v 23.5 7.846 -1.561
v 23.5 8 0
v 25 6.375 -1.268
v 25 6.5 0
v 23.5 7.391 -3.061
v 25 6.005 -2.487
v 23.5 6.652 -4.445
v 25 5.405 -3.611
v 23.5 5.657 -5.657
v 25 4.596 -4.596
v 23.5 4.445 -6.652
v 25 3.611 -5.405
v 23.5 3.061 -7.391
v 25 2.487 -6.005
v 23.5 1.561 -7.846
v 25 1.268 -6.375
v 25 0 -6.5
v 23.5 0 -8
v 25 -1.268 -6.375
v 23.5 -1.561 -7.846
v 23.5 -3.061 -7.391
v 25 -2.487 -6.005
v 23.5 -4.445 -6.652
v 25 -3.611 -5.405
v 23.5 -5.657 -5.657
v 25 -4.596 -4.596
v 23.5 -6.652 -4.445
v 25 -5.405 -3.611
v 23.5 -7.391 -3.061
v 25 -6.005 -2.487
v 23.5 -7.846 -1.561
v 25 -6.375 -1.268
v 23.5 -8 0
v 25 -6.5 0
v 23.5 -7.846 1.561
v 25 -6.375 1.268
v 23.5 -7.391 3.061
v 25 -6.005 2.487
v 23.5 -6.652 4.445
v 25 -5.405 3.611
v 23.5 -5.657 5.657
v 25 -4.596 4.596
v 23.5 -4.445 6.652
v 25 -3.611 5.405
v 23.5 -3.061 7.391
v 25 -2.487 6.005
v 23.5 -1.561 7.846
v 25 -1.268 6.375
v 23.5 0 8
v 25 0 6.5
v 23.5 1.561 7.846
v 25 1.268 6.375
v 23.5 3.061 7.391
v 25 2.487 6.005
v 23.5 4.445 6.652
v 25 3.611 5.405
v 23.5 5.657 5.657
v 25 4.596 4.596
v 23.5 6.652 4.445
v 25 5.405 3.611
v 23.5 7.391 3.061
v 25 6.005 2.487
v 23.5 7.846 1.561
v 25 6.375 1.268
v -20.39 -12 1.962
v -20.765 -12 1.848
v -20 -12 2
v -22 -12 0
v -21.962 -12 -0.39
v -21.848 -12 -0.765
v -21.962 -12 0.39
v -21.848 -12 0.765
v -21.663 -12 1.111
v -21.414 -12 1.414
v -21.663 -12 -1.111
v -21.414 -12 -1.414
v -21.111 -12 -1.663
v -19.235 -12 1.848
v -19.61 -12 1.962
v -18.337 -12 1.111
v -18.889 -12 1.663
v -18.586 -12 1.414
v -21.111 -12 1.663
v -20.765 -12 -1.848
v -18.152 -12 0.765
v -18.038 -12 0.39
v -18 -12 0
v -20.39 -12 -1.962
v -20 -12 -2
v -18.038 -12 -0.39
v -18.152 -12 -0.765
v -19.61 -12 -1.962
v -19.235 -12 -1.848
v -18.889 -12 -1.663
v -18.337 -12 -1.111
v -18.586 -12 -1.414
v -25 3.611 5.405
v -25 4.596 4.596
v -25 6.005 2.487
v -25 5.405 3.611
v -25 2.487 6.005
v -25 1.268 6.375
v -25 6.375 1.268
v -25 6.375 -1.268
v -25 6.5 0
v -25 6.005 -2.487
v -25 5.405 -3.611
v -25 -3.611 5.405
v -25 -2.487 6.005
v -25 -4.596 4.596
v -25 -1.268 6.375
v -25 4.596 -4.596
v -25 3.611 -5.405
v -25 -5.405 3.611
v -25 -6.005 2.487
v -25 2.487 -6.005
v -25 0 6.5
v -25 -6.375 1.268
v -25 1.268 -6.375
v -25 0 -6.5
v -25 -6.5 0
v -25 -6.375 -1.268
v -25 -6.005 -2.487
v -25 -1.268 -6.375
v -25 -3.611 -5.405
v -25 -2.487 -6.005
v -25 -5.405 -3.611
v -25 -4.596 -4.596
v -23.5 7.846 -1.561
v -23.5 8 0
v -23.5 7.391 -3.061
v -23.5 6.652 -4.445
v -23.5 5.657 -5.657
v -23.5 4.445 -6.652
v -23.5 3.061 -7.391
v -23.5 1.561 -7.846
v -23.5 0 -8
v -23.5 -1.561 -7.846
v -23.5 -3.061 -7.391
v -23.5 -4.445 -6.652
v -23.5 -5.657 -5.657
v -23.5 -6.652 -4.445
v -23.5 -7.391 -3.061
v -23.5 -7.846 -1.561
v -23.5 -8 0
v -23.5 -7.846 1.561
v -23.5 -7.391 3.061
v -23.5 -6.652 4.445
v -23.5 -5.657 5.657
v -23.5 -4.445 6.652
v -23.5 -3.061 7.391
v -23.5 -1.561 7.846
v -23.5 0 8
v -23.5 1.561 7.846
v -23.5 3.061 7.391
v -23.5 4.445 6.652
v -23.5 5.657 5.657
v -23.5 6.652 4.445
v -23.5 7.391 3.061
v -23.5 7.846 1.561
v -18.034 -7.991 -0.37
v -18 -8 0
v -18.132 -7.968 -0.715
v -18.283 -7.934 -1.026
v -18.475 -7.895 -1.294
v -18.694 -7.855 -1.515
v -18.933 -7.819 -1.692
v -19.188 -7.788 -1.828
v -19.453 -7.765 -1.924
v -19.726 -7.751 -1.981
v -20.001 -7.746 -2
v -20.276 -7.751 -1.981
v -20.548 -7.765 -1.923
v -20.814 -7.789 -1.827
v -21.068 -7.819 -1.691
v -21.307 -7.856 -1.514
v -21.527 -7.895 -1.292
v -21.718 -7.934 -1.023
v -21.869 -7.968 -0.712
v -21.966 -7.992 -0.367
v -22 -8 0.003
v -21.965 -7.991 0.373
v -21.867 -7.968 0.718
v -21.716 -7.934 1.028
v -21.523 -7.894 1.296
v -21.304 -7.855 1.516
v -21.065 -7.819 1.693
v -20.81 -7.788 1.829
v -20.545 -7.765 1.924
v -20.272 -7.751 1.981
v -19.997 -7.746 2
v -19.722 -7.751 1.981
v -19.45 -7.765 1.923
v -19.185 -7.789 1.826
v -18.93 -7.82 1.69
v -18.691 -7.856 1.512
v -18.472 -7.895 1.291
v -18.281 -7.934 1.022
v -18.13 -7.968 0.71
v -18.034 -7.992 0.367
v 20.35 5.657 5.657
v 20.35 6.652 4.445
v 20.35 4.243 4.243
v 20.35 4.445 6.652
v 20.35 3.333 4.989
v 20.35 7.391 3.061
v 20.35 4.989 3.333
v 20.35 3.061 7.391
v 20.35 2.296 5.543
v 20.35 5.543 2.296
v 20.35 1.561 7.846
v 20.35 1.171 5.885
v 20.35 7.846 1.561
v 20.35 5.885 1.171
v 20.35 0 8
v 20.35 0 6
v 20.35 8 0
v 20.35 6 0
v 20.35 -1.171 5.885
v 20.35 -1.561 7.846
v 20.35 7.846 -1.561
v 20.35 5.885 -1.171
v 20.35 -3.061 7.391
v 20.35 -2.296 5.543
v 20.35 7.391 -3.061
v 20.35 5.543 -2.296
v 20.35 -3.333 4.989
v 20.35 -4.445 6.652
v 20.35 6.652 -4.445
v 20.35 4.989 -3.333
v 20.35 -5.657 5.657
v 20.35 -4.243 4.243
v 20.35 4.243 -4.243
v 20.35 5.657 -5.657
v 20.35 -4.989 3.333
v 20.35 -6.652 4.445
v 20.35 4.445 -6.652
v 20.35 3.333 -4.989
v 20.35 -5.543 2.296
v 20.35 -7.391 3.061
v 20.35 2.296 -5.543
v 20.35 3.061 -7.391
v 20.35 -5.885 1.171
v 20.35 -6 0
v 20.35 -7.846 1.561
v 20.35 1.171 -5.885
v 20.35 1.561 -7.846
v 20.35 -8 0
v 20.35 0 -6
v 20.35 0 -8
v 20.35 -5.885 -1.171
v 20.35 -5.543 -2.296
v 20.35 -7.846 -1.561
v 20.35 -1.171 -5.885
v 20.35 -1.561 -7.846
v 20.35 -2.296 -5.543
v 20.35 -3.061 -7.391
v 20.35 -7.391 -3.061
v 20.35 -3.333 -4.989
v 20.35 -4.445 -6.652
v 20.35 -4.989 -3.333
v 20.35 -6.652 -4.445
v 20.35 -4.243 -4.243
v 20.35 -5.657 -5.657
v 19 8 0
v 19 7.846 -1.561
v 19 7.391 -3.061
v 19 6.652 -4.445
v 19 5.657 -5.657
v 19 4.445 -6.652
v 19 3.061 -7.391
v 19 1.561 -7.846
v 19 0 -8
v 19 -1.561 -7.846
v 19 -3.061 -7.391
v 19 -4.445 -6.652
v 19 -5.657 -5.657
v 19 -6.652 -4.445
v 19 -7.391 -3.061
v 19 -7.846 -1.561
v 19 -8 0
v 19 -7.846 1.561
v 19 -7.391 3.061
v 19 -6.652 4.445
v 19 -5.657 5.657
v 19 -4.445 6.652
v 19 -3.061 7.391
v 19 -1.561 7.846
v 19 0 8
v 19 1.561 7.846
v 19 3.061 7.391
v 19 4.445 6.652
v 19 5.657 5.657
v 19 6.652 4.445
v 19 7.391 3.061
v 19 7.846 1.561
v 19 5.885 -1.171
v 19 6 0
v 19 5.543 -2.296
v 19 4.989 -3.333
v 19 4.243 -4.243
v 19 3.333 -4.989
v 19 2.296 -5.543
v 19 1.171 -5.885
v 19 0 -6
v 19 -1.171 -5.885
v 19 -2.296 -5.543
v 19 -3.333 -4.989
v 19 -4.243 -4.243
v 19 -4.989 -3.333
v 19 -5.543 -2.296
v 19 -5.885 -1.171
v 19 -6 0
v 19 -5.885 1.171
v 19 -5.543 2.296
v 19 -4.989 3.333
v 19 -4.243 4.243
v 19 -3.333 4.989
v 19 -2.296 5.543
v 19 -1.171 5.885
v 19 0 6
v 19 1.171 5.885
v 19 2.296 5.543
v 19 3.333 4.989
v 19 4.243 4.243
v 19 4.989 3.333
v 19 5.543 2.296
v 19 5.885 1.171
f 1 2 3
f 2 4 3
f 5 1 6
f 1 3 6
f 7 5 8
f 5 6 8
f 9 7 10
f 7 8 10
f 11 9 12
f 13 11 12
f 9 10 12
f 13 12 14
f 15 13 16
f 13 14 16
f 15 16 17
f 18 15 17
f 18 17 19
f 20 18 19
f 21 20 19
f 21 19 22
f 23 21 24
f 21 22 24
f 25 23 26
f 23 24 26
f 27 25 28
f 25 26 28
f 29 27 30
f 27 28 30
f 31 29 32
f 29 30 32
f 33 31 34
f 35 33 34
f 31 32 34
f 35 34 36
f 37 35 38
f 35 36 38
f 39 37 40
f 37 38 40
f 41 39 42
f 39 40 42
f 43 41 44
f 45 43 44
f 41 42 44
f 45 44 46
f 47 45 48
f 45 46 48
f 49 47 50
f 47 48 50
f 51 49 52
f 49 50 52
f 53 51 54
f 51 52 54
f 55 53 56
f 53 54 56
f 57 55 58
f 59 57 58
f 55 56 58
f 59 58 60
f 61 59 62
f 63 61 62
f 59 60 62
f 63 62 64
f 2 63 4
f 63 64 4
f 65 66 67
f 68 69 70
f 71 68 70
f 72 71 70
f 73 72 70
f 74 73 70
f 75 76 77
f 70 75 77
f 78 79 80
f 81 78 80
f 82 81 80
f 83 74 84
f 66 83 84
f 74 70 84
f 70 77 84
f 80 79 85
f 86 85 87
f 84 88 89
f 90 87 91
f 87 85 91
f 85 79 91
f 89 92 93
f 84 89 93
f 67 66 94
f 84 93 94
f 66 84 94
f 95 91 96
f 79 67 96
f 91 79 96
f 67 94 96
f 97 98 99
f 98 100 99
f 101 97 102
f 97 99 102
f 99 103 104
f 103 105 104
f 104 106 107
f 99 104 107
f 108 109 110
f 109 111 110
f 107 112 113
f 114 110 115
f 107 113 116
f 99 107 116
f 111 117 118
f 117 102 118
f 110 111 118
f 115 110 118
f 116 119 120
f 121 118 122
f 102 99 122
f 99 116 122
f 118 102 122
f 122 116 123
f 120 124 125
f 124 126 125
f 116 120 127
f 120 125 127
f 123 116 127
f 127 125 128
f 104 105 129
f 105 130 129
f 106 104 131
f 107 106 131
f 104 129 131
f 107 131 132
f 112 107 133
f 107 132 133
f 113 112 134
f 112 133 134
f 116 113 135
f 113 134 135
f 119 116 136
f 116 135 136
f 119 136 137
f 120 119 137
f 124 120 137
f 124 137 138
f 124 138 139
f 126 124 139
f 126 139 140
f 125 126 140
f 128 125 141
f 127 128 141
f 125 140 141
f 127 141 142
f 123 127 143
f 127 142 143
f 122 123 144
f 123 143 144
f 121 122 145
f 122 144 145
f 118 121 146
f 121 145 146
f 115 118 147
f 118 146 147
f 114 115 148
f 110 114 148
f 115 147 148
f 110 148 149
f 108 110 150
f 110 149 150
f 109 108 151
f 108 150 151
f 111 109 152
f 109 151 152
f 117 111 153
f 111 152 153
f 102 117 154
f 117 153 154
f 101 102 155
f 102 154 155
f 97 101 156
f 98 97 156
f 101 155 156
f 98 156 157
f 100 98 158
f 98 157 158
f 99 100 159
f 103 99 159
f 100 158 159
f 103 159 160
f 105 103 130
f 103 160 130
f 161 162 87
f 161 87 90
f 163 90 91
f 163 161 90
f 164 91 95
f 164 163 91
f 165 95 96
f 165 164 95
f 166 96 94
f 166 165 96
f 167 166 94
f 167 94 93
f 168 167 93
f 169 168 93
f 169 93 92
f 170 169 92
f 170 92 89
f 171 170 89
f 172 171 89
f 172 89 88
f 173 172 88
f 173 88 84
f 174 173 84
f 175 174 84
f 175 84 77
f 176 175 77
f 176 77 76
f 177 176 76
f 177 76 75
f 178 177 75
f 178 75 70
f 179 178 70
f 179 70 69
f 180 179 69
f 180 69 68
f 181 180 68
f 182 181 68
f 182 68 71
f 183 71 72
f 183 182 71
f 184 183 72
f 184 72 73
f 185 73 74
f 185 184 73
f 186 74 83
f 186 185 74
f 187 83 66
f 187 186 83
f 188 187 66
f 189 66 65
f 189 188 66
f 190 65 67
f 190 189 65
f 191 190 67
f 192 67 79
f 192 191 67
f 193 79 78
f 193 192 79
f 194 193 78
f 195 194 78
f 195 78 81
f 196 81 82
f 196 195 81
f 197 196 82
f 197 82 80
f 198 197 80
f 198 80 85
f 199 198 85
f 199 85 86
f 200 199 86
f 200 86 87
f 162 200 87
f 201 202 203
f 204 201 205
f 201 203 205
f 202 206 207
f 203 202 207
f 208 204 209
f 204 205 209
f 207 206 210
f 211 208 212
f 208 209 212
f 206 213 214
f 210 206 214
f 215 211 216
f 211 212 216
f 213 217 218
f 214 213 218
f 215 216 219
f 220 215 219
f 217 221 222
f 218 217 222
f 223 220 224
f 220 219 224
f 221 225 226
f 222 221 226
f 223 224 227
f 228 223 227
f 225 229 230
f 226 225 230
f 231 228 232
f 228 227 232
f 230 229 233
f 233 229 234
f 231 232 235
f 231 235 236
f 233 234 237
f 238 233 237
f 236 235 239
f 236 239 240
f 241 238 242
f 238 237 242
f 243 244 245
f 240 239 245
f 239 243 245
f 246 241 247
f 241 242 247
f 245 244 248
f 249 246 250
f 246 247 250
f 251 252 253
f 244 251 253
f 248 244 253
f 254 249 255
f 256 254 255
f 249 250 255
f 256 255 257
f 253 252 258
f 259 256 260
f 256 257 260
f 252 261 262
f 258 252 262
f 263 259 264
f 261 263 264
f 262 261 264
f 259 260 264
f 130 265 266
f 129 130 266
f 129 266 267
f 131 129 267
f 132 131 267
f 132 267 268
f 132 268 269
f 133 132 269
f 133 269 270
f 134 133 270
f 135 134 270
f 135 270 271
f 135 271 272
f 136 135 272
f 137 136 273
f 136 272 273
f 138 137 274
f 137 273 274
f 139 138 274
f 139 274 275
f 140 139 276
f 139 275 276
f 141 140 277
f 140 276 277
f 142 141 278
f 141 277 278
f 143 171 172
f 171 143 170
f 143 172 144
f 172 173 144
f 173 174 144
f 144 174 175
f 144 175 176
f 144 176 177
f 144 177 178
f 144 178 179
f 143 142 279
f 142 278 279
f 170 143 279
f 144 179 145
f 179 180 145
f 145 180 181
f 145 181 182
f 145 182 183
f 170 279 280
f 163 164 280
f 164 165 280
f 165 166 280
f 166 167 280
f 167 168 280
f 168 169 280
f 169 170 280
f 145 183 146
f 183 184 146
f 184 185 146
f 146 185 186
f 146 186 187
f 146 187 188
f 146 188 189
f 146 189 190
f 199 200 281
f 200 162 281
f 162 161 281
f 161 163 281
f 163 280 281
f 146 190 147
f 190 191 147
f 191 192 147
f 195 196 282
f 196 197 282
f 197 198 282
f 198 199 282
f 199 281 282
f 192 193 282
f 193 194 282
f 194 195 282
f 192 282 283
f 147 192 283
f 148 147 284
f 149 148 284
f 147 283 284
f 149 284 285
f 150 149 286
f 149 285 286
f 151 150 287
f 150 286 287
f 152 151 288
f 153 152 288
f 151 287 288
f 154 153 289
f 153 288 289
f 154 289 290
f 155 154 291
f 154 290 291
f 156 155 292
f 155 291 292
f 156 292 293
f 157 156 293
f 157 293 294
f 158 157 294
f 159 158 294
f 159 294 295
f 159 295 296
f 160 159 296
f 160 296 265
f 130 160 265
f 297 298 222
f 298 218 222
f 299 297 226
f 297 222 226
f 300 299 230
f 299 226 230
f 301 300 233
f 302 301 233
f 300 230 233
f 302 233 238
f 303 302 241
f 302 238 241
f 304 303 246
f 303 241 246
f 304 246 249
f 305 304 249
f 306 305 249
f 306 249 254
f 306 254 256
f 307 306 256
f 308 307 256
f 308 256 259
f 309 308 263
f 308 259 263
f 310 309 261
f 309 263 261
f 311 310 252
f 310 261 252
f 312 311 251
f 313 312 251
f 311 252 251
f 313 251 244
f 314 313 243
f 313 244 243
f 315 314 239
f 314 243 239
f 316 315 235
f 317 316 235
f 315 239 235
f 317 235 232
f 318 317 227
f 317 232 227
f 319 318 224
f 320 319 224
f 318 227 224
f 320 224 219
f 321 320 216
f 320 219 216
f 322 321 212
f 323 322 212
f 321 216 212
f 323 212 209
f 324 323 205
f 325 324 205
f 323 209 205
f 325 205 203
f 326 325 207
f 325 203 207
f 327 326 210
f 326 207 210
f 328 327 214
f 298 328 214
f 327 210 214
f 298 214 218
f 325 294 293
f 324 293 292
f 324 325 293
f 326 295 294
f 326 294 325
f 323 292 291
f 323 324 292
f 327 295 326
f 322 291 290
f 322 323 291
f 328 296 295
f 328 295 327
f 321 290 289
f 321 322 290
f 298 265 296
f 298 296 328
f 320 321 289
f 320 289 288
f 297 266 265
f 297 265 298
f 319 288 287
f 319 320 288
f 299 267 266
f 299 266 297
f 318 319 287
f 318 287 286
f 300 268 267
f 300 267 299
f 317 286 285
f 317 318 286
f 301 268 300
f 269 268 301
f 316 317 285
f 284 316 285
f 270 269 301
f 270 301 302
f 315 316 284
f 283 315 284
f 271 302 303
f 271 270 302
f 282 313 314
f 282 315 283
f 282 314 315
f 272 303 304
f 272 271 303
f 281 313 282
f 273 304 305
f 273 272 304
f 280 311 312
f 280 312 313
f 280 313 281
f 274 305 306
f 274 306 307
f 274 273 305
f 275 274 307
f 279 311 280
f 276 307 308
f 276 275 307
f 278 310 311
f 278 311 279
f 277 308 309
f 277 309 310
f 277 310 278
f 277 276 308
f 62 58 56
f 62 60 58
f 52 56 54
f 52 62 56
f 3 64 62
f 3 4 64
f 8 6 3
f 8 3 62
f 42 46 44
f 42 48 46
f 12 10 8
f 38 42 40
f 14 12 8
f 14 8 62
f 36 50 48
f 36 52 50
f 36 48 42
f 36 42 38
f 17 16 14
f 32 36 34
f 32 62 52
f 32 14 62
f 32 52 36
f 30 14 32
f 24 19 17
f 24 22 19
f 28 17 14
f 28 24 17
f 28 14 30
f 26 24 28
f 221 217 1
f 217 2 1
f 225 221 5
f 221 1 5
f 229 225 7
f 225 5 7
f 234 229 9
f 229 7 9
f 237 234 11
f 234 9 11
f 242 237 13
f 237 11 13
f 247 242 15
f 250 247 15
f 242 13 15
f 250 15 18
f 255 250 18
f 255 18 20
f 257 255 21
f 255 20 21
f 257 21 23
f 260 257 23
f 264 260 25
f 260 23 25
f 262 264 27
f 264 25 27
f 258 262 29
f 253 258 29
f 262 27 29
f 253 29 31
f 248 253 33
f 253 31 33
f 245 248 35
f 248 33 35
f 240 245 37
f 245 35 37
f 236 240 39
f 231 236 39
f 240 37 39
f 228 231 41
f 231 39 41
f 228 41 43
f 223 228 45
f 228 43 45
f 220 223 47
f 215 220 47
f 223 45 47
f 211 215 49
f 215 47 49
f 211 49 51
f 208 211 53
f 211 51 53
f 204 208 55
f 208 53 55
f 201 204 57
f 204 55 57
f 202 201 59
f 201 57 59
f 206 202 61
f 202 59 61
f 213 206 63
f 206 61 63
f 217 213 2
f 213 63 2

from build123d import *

# Parameters (mm, degrees)
SKETCH1_W           = 44
SKETCH1_H           = 8
SKETCH3_R           = 2
BOSS_EXTRUDE1_DEPTH = 12
SKETCH4_W           = 6
SKETCH4_H           = 8
SKETCH5_W           = 1.35
SKETCH5_H           = 2


with BuildPart() as part:
    # Sketch1 → Revolve1 (revolve)
    with BuildSketch(Plane.XY):
        with Locations((-3, 4)):
            Rectangle(SKETCH1_W, SKETCH1_H)
    revolve(axis=Axis((19, 0, 0), (-1, 0, 0)))

    # Sketch2 → Cut-Revolve1 (revolve, cut)
    with BuildSketch(Plane.XY):
        Polygon((-25, 6.5), (-23.5, 8), (-25, 8), align=None)
    revolve(axis=Axis((39, 0, 0), (-1, 0, 0)), mode=Mode.SUBTRACT)

    # Sketch3 → Boss-Extrude1 (add)
    with BuildSketch(Plane(origin=(0, 0, 0), x_dir=(1, 0, 0), z_dir=(0, 1, 0))):
        with Locations((-20, 0)):
            Circle(SKETCH3_R)
    extrude(amount=-BOSS_EXTRUDE1_DEPTH)

    # Sketch4 → Revolve2 (revolve)
    with BuildSketch(Plane.XY):
        with Locations((22, 4)):
            Rectangle(SKETCH4_W, SKETCH4_H)
    revolve(axis=Axis((25, 0, 0), (-1, 0, 0)))

    # Sketch5 → Cut-Revolve2 (revolve, cut)
    with BuildSketch(Plane.XY):
        with Locations((19.675, 7)):
            Rectangle(SKETCH5_W, SKETCH5_H)
    revolve(axis=Axis((39, 0, 0), (-1, 0, 0)), mode=Mode.SUBTRACT)

    # Sketch6 → Cut-Revolve3 (revolve, cut)
    with BuildSketch(Plane.XY):
        Polygon((23.5, 8), (25, 6.5), (25, 8), align=None)
    revolve(axis=Axis((39, 0, 0), (-1, 0, 0)), mode=Mode.SUBTRACT)


solid = part.part
